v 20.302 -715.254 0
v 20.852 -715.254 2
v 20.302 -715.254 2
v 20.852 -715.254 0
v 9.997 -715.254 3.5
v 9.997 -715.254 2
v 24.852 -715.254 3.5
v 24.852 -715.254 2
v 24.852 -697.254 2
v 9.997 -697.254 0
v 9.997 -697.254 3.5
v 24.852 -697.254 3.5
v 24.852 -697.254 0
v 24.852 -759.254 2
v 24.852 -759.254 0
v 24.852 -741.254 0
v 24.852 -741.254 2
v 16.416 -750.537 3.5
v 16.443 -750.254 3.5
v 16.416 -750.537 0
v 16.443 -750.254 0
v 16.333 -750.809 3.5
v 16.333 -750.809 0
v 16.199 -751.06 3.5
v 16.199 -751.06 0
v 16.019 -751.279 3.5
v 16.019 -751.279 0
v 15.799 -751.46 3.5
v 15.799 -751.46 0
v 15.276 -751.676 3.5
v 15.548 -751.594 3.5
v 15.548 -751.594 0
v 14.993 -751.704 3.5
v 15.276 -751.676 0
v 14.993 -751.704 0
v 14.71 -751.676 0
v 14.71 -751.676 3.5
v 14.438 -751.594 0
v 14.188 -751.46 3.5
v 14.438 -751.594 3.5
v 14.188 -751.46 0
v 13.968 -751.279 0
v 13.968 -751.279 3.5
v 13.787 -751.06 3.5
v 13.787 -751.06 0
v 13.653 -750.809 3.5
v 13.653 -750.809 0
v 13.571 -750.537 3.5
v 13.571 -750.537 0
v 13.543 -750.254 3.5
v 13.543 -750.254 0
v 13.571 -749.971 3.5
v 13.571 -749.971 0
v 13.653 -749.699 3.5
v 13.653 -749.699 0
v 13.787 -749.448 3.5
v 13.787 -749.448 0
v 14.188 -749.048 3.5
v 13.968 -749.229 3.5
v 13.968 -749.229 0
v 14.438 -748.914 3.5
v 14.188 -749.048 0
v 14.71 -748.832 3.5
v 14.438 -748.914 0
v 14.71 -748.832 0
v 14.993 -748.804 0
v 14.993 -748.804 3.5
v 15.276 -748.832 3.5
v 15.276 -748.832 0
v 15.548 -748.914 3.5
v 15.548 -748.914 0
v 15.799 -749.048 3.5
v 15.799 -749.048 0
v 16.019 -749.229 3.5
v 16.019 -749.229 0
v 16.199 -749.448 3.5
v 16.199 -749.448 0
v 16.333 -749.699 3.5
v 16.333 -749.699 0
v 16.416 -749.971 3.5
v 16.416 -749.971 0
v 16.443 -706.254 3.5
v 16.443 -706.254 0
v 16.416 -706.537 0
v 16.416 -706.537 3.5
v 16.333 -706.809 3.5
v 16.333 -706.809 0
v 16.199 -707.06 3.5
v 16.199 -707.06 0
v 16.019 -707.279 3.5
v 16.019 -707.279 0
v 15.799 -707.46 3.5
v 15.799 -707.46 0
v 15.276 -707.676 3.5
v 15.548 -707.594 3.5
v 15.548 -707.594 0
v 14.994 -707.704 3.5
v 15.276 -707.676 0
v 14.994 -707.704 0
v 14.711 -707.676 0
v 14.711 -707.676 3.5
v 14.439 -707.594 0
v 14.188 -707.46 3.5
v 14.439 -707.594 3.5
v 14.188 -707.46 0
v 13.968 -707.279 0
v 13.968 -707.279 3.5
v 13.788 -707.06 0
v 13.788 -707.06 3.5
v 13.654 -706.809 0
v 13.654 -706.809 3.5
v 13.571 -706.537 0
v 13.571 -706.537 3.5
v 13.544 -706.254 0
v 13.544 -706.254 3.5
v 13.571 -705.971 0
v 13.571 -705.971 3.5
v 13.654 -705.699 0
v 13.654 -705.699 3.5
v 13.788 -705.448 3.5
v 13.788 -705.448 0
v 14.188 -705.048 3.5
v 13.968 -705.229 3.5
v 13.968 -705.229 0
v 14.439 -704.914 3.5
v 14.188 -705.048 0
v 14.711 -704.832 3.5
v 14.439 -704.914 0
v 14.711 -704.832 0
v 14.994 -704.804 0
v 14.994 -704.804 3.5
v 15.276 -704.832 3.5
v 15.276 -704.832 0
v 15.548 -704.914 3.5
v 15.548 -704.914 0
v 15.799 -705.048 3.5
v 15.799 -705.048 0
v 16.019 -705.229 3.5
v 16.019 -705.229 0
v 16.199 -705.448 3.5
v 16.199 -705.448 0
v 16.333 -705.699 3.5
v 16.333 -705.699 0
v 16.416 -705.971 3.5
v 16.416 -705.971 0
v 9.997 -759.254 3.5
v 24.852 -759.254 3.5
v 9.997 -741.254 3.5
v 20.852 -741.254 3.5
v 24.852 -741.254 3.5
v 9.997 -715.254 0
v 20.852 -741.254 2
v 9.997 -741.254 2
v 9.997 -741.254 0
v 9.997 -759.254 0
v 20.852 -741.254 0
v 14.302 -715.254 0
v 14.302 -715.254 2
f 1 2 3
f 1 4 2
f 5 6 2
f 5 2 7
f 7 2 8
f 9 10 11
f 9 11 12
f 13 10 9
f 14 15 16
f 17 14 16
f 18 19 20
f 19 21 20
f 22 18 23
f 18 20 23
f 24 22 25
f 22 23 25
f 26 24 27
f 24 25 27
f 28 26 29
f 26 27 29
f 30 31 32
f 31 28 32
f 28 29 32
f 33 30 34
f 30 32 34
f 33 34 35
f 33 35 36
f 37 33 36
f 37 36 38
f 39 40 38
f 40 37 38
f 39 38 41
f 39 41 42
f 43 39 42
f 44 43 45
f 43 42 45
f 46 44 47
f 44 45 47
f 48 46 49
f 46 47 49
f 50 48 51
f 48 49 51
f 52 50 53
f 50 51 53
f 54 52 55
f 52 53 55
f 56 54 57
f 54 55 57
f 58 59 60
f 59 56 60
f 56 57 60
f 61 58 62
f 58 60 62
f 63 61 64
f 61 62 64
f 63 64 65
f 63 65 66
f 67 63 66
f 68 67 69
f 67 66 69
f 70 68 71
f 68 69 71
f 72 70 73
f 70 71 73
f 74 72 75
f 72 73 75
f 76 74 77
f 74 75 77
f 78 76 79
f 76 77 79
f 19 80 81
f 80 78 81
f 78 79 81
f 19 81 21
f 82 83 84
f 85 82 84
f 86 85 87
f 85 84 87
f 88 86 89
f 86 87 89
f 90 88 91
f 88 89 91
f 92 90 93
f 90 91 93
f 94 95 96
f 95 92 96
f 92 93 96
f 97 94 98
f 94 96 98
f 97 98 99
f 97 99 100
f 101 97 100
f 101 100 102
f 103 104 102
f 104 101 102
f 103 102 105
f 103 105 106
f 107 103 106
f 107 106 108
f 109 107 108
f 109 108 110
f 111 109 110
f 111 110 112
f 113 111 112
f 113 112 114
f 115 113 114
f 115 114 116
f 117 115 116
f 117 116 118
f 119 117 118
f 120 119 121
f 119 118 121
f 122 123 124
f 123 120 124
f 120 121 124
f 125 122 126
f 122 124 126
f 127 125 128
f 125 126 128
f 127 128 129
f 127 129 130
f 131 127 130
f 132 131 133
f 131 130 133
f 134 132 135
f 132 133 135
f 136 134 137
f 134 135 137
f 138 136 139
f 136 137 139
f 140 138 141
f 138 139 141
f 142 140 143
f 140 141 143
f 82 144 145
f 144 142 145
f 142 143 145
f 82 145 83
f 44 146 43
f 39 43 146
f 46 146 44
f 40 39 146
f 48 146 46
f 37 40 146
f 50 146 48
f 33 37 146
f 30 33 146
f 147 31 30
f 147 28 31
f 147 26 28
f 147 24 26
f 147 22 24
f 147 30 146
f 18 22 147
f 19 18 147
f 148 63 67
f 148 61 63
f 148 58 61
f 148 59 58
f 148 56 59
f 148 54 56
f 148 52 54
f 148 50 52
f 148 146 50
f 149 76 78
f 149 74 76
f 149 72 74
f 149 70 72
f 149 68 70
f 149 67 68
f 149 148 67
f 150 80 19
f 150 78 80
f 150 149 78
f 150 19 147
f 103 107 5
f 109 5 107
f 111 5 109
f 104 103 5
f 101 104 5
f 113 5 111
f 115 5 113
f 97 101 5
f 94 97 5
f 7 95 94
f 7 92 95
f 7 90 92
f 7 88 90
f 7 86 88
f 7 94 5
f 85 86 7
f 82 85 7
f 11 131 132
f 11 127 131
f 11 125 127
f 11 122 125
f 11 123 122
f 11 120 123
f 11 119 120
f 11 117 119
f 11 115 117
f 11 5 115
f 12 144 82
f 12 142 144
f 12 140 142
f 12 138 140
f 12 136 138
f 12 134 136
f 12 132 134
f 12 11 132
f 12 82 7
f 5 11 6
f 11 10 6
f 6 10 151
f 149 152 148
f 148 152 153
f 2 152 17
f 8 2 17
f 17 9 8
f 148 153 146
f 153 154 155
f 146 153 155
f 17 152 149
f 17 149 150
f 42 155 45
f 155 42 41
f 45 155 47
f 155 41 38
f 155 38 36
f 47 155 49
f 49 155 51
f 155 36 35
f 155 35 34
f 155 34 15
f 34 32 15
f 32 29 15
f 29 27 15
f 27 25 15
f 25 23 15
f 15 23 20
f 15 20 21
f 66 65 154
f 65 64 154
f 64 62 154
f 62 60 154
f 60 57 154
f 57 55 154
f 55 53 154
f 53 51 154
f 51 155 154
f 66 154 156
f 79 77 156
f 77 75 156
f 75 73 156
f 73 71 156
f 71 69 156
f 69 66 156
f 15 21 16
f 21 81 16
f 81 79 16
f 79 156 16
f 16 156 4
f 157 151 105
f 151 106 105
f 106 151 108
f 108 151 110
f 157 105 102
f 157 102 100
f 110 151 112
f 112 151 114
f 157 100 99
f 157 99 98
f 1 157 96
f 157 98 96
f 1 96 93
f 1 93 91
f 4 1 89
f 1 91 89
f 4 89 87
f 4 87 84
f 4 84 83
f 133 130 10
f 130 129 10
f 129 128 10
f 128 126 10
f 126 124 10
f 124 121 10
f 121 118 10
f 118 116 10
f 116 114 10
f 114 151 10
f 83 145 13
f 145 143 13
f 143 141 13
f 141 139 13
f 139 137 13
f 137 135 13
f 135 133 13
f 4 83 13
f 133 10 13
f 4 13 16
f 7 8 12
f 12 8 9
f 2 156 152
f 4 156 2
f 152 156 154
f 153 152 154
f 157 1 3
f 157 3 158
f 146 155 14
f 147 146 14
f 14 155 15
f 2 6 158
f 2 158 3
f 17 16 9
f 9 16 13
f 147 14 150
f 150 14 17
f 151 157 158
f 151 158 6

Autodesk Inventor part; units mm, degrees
ref_plane "YZ Plane" through (0, 0, 0) normal (1, 0, 0) x (0, 1, 0)
ref_plane "XZ Plane" through (0, 0, 0) normal (0, 1, 0) x (-1, 0, 0)
ref_plane "XY Plane" through (0, 0, 0) normal (0, 0, 1) x (1, 0, 0)
sketch "Sketch1" plane through (0, 0, 0) normal (0, 0, 1) x (1, 0, 0)
  circle A0 centre (14.9935, -706.254) radius 1.4499
  circle A1 centre (14.9932, -750.254) radius 1.4502
  line L0 (24.8521, -741.254) -> (24.8525, -697.2541) projected
  line L1 (24.8519, -759.254) -> (24.8521, -741.254) projected
  line L2 (20.3016, -715.254) -> (14.3016, -715.254) projected
  line L3 (9.9969, -697.2539) -> (24.8525, -697.2541)
  line L4 (24.8525, -697.2541) -> (24.8527, -715.2539)
  line L5 (24.8527, -715.2539) -> (24.8527, -715.2539)
  line L6 (24.8521, -741.254) -> (9.9968, -741.2539)
  line L7 (9.9968, -741.2539) -> (9.9968, -759.2539)
  line L8 (9.9968, -759.2539) -> (24.8519, -759.254)
  line L9 (24.8519, -759.254) -> (24.8521, -741.254)
  line L10 (24.8527, -715.2539) -> (9.9968, -715.2538)
  line L11 (9.9969, -697.2539) -> (9.9968, -715.2538)
  line L12 (24.8527, -715.2539) -> (24.8521, -741.254)
  line L13 (24.8521, -741.254) -> (20.8521, -741.254)
  line L14 (20.8521, -741.254) -> (20.8522, -715.2538)
  point P0 (0, 0)
  point P1 (24.8523, -715.2539)
extrude "Extrusion1" add sketch "Sketch1" along normal blind 2
sketch "Sketch3" plane through (0, 0, 2) normal (0, 0, 1) x (1, 0, 0)
  line L0 (9.9968, -715.2538) -> (20.8522, -715.2538) projected
  line L1 (20.8522, -715.2538) -> (20.8521, -741.254) projected
  line L2 (20.8521, -741.254) -> (9.9968, -741.2539) projected
  line L3 (9.9968, -741.2539) -> (9.9968, -759.2539) projected
  line L4 (9.9968, -759.2539) -> (24.8519, -759.254) projected
  line L5 (24.8519, -759.254) -> (24.8525, -697.2541) projected
  line L6 (24.8525, -697.2541) -> (9.9969, -697.2539) projected
  line L7 (9.9969, -697.2539) -> (9.9968, -715.2538) projected
  circle A0 centre (14.9935, -706.254) radius 1.4499 projected
  circle A1 centre (14.9932, -750.254) radius 1.4502 projected
  line L8 (9.9968, -715.2538) -> (20.8522, -715.2538) projected
  line L9 (20.8522, -715.2538) -> (24.8523, -715.2538)
  line L10 (24.8519, -759.254) -> (24.8525, -697.2541) projected
  line L11 (20.8522, -715.2538) -> (20.8521, -741.254) projected
  line L12 (20.8521, -741.254) -> (24.8521, -741.254)
  point P0 (0, 0)
extrude "Extrusion3" add sketch "Sketch3" along normal blind 1.5 contours L7 L6 L5 L9 L0 | L12 L5 L4 L3 L2
properties part number "imu_cable_holder"
